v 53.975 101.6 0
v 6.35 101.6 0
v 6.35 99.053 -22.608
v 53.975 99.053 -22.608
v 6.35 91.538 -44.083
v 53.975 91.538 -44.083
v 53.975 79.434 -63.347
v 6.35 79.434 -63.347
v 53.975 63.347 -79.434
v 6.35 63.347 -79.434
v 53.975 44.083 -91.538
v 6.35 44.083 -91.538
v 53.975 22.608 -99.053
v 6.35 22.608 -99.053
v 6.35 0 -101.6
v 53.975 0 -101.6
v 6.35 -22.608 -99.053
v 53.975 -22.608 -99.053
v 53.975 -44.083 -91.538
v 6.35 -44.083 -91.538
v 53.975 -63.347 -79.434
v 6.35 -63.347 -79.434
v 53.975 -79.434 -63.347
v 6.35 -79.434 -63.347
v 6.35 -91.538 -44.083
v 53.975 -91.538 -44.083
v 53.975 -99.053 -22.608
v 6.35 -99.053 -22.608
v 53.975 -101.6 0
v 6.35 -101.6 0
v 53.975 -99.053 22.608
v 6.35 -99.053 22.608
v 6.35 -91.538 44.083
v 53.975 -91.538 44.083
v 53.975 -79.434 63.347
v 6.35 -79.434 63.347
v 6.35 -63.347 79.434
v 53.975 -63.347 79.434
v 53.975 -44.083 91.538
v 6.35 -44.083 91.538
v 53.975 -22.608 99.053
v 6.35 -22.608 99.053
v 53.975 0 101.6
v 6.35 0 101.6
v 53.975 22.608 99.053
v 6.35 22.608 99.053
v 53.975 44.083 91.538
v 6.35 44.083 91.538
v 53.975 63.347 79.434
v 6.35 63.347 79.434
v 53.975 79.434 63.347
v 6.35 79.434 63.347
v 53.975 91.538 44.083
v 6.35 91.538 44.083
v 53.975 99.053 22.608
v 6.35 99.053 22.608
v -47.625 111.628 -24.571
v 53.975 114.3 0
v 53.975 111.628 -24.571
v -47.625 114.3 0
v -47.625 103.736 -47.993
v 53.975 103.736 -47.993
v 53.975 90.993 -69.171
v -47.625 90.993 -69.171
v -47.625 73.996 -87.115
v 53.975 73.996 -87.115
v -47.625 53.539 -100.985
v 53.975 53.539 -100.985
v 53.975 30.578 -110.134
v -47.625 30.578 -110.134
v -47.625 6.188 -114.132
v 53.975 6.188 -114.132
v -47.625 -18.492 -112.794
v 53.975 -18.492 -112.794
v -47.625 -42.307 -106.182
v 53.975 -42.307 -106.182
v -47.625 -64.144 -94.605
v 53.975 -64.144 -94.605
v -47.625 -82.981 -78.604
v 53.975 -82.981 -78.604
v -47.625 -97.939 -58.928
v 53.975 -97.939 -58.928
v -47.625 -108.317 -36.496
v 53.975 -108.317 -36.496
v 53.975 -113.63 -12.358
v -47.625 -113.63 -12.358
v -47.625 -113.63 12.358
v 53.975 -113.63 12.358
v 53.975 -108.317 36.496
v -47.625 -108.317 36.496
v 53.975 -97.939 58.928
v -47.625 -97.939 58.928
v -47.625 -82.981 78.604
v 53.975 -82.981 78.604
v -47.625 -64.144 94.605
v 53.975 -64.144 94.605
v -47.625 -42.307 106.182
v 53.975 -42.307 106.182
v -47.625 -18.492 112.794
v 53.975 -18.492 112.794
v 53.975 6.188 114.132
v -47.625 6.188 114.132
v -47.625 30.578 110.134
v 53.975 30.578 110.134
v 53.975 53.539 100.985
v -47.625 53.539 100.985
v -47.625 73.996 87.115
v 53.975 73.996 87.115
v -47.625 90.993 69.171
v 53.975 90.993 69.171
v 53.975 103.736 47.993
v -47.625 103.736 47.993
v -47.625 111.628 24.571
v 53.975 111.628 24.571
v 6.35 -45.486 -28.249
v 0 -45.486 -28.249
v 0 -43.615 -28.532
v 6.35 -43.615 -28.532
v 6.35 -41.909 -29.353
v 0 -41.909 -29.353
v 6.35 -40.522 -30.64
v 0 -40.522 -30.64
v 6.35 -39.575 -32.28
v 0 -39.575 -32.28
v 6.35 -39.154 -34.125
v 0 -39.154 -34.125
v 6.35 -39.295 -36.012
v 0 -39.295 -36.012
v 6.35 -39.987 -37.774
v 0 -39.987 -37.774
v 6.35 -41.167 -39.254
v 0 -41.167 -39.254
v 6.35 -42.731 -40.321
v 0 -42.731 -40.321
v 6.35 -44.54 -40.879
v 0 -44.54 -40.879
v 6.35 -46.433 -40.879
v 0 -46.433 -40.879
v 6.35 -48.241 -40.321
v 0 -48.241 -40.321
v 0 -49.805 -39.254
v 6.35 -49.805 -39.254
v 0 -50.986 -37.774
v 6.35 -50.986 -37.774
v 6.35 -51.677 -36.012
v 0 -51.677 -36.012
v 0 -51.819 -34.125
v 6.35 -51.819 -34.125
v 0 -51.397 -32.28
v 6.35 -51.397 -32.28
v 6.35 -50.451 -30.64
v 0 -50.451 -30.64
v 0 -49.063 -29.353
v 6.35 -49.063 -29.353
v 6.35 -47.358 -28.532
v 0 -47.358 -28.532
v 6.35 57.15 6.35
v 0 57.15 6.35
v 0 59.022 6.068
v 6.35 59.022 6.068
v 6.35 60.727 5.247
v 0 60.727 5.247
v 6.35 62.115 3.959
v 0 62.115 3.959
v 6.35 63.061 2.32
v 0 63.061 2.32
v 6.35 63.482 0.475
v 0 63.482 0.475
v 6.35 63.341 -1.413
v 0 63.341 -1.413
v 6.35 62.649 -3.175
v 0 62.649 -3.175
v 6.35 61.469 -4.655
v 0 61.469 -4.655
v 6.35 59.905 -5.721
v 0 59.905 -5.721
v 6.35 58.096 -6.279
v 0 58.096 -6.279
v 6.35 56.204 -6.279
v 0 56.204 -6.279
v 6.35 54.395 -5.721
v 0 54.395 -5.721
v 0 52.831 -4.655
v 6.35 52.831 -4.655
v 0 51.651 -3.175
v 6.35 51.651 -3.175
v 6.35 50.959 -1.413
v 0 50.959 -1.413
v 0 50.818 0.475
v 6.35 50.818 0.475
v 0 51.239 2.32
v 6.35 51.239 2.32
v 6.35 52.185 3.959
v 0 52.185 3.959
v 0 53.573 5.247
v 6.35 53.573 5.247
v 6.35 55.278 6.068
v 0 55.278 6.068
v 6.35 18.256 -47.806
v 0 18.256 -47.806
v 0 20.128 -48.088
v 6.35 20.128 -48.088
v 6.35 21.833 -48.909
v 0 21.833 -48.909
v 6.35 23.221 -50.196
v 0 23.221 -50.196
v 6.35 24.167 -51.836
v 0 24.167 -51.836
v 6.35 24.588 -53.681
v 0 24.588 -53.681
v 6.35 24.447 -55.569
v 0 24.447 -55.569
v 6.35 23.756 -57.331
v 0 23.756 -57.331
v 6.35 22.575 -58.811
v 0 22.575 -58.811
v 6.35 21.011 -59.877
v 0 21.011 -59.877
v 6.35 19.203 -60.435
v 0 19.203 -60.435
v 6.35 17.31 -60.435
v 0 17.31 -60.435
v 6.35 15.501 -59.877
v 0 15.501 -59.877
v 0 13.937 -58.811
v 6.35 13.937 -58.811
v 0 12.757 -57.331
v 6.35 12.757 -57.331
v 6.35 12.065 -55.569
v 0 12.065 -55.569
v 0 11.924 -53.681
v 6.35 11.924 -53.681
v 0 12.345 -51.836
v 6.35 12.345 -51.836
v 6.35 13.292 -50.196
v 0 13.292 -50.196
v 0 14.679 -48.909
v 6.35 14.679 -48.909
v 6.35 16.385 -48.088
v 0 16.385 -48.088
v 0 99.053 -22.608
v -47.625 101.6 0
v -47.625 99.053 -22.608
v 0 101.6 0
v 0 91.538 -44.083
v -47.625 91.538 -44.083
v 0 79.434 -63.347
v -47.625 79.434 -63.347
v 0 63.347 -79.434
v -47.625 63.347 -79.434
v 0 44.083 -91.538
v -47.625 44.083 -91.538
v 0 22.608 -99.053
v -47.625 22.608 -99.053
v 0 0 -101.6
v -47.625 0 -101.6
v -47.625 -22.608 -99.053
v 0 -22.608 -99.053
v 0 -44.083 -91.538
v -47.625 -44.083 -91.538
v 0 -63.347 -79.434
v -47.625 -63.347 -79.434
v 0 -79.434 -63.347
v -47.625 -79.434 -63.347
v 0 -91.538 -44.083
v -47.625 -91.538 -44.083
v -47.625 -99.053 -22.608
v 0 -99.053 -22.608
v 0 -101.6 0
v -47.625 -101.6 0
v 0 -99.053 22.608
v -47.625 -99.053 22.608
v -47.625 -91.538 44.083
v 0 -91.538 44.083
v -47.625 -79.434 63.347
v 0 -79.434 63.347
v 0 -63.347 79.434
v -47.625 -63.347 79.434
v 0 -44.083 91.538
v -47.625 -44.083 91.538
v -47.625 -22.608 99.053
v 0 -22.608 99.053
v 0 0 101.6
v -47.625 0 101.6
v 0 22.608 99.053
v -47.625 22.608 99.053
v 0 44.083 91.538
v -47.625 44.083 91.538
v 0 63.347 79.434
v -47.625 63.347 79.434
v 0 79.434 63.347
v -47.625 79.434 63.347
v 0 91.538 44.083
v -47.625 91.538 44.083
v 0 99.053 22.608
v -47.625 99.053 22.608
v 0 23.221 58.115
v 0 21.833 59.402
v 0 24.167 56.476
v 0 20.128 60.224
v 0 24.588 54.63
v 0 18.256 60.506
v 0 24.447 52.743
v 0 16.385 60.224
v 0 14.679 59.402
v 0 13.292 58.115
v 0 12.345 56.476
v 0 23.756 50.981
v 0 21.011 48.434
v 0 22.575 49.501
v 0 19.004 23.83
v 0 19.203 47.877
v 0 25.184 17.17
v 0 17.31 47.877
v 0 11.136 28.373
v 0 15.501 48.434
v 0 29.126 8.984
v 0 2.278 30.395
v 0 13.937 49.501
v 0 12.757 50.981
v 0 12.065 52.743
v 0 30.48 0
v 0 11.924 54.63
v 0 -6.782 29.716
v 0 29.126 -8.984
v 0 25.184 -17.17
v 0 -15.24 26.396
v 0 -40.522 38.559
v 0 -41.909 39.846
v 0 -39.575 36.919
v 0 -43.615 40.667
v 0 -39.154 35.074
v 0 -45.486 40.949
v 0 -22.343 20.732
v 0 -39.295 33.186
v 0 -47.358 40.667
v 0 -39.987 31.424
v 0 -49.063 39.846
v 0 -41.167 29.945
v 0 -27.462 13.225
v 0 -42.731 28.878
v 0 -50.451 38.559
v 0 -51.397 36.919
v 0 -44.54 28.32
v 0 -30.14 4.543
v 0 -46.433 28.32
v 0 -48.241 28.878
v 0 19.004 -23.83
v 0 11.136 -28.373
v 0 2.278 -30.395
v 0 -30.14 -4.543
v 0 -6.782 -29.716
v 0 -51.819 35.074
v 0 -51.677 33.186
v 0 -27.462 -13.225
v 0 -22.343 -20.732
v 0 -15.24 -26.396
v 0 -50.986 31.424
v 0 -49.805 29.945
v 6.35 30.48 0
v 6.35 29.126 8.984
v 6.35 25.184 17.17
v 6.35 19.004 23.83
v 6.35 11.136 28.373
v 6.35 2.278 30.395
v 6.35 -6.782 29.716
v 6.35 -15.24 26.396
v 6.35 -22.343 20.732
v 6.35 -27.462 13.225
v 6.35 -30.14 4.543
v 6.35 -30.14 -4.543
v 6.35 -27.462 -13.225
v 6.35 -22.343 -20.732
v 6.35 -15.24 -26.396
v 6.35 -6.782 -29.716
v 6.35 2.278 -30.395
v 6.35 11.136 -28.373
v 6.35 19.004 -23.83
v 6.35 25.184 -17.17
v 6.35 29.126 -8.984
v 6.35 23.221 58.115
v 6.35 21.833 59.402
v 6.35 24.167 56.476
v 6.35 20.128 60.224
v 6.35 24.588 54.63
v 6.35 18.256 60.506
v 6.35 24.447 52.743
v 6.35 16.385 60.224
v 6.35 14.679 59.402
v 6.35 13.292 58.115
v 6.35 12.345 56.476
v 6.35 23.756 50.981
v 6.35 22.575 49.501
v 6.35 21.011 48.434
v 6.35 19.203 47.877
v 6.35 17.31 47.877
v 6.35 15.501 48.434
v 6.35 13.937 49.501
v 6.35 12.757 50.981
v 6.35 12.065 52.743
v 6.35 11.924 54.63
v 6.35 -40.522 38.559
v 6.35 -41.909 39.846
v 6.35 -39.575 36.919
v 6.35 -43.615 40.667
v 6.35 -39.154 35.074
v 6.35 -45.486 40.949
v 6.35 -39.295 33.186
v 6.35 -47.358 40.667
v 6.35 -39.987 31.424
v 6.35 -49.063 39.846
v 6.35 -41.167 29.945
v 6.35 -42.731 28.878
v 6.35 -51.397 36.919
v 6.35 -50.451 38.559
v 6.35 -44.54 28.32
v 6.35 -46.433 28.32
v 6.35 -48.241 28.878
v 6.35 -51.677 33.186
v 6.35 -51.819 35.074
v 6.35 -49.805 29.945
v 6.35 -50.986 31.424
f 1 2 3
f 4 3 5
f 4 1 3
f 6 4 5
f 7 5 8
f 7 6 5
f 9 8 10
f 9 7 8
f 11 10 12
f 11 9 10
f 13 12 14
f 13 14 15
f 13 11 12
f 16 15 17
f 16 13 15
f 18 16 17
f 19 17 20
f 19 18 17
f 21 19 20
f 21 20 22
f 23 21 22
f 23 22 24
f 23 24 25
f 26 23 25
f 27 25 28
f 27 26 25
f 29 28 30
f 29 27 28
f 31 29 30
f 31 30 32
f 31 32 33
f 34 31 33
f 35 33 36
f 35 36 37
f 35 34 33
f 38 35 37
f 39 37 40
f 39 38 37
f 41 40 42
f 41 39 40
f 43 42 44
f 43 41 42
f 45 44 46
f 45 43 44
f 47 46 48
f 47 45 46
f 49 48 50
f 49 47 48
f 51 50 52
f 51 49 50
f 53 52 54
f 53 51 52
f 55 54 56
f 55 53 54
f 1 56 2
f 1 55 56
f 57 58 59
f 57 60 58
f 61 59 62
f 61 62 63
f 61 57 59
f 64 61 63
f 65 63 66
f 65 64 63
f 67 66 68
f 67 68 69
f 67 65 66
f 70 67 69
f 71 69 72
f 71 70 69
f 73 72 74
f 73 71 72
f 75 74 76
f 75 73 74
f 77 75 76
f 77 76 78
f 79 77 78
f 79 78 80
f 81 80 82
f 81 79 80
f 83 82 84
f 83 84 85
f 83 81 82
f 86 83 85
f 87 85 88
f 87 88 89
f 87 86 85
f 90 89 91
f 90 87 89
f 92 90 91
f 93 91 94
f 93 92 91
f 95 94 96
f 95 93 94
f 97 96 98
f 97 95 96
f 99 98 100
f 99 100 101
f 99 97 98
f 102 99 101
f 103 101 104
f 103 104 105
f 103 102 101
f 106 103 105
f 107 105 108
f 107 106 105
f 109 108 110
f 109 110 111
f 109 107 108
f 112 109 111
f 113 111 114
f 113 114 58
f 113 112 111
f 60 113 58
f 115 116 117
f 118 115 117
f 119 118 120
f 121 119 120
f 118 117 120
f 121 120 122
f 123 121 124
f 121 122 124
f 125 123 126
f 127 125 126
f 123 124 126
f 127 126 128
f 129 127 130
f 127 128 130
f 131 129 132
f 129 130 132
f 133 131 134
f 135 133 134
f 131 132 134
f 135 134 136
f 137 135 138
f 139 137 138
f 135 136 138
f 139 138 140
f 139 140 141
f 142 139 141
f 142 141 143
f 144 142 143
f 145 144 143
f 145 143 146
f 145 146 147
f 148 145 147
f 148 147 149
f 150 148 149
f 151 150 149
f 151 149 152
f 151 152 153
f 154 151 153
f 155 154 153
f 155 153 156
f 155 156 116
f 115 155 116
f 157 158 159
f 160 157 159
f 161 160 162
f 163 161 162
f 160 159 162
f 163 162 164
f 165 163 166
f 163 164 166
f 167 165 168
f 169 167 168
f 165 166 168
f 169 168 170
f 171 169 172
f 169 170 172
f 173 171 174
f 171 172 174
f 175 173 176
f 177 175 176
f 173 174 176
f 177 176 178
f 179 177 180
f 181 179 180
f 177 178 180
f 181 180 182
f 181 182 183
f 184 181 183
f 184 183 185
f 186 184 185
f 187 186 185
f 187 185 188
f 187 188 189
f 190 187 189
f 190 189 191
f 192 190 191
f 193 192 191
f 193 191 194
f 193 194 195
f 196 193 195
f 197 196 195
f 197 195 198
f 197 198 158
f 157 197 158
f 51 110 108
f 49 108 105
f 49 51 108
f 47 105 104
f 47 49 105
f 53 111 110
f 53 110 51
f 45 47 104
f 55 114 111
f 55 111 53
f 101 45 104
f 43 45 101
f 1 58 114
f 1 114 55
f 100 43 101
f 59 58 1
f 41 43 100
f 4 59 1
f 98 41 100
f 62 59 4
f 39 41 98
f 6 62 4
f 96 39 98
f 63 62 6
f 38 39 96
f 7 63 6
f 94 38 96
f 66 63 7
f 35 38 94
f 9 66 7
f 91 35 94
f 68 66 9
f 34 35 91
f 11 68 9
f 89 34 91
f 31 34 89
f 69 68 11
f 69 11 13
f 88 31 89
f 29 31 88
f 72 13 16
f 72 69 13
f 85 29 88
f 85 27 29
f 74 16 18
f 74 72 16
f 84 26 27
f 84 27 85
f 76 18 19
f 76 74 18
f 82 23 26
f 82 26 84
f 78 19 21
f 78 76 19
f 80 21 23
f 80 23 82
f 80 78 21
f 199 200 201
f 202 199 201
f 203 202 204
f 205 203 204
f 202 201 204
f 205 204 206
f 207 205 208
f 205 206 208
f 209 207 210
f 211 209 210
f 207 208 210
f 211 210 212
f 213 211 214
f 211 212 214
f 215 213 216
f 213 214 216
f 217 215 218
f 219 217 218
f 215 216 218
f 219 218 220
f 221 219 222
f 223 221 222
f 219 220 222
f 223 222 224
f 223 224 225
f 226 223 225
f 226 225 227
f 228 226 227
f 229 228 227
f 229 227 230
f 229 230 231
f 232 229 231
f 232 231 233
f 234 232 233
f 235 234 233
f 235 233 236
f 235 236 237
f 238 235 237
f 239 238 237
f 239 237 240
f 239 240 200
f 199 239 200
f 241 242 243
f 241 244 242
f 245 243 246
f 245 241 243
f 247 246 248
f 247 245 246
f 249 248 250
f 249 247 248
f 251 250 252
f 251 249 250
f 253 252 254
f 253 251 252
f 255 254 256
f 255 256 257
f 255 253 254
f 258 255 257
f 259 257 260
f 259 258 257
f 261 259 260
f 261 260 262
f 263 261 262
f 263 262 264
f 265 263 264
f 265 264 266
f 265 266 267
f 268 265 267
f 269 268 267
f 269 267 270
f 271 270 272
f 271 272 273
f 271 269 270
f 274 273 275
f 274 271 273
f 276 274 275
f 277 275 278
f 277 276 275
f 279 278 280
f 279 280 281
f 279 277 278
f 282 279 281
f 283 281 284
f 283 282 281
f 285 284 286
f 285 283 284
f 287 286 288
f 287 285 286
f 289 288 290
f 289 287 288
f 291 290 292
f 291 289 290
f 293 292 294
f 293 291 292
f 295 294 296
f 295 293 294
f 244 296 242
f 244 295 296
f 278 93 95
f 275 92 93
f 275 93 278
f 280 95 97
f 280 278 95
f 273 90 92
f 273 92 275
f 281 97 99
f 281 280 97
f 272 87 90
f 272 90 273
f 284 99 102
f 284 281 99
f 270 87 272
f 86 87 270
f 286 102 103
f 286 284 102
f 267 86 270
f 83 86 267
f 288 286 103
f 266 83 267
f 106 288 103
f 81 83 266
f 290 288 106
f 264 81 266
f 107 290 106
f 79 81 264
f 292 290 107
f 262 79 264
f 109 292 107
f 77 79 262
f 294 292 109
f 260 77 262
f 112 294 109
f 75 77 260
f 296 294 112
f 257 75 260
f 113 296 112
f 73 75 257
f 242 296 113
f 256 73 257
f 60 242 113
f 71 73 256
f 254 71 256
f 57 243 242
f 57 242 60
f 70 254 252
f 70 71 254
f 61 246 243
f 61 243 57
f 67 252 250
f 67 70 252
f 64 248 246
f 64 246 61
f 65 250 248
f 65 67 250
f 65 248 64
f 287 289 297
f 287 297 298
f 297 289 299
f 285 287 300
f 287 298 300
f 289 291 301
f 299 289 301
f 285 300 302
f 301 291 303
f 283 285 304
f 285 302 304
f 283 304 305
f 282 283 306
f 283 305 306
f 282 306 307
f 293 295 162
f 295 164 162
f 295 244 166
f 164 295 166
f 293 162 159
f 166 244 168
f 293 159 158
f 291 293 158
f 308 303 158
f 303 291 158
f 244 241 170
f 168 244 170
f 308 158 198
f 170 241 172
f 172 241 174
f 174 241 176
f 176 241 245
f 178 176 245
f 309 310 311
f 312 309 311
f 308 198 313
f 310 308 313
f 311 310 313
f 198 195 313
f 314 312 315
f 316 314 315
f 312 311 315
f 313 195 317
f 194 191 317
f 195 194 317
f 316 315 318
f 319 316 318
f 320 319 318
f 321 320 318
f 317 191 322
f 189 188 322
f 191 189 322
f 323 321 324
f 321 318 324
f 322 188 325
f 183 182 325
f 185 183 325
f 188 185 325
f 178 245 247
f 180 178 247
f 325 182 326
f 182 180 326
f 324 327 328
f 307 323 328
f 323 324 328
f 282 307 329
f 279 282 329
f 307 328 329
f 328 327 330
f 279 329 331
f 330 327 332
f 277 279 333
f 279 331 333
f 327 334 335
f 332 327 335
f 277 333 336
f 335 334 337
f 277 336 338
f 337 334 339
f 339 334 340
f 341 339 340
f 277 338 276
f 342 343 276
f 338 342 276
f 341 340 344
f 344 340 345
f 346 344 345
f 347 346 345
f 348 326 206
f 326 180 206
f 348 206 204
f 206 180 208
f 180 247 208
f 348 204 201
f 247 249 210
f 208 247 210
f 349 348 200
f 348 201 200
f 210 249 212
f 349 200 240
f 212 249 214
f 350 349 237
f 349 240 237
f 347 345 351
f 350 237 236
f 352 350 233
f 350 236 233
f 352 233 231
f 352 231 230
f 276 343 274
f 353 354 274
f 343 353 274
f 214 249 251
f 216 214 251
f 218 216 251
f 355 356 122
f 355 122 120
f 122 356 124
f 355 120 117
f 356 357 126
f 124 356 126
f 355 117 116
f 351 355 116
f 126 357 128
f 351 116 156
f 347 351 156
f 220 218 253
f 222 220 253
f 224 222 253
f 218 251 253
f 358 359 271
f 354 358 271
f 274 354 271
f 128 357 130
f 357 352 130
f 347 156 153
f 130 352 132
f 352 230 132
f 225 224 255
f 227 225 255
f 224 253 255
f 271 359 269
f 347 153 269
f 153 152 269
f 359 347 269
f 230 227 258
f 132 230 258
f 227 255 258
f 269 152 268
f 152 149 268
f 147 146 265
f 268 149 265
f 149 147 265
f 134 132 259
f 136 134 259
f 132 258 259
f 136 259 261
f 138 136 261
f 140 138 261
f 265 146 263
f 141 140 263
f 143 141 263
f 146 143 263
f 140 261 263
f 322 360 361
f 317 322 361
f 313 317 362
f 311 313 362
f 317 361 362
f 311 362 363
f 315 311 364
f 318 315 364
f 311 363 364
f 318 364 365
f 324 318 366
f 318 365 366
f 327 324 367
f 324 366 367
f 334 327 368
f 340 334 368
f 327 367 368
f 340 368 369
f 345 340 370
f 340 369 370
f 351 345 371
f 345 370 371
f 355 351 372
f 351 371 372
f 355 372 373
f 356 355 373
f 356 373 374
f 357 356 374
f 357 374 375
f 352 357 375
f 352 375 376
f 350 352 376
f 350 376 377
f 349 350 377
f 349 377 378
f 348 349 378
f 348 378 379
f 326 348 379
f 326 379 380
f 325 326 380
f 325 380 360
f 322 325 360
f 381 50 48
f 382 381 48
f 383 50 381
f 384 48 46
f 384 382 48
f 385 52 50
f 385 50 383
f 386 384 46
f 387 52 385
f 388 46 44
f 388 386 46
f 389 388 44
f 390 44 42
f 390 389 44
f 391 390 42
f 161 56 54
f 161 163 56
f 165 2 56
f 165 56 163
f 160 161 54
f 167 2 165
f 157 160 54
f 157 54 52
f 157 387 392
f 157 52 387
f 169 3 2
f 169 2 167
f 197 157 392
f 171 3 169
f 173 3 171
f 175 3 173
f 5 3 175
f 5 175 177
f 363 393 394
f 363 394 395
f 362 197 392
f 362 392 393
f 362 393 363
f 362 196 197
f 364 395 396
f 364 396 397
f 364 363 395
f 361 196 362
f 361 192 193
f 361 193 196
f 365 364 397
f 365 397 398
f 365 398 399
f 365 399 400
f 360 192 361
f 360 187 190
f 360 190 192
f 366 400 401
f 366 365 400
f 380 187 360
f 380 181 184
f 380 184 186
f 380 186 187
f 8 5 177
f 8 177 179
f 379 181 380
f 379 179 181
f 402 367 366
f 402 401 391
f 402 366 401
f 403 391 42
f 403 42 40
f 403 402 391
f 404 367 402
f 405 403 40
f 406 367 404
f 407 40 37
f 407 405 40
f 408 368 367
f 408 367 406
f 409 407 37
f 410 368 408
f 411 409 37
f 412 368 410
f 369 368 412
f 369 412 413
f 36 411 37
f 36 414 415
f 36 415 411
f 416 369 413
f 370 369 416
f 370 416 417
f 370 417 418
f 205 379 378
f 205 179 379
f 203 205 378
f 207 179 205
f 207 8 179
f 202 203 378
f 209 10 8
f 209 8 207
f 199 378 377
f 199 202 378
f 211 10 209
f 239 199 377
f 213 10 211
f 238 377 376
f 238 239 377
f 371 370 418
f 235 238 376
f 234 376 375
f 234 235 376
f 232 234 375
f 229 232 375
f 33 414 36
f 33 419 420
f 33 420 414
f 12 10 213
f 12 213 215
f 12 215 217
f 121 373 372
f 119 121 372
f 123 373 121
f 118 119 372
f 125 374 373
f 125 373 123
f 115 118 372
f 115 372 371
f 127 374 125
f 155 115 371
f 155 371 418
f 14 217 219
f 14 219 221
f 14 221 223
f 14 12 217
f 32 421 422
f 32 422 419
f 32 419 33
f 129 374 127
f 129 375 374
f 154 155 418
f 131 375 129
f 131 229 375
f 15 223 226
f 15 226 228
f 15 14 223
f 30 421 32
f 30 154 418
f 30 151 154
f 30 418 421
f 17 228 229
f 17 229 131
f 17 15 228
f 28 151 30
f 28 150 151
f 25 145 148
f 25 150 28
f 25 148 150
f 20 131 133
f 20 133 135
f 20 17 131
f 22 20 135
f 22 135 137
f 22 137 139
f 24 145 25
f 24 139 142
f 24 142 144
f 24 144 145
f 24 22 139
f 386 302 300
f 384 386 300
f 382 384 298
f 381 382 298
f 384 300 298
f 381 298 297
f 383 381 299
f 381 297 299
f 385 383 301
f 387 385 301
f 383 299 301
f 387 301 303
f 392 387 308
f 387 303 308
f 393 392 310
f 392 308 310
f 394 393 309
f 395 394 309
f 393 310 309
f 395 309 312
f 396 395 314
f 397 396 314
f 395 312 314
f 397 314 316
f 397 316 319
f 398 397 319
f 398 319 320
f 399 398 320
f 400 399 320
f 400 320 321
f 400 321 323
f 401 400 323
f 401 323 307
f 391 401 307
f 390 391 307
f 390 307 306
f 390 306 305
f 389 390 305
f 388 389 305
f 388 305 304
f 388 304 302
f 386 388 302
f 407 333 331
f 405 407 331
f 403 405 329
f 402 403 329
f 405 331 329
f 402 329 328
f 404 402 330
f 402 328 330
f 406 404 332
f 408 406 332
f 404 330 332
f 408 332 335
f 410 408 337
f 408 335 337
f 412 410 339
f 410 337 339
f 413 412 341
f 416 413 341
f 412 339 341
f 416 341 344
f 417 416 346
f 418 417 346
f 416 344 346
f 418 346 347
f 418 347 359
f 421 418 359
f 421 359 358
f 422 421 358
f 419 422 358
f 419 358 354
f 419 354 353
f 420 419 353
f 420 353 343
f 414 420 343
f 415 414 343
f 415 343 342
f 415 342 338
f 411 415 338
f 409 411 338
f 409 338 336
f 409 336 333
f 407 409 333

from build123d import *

# Parameters (mm, degrees)
SKETCH1_W                  = 6.35
SKETCH1_H                  = 101.6
SKETCH2_R                  = 30.48
CUT_EXTRUDE2_DEPTH         = 171.417958634
F_1_2_0_5_DIAMETER_HOLE2_D = 12.7


with BuildPart() as part:
    # Sketch1 → Revolve1 (revolve)
    with BuildSketch(Plane.XY):
        with Locations((3.175, 50.8)):
            Rectangle(SKETCH1_W, SKETCH1_H)
        Polygon((-47.625, 101.6), (0, 101.6), (6.35, 101.6), (53.975, 101.6), (53.975, 114.3), (-47.625, 114.3), align=None)
    revolve(axis=Axis((6.35, 0, 0), (-1, 0, 0)))

    # Sketch2 → Cut-Extrude2 (cut, through all)
    with BuildSketch(Plane(origin=(6.35, 0, 0), x_dir=(0, 0, -1), z_dir=(1, 0, 0))):
        with Locations(Location((0, 0, 0), (0, 0, 90))):
            Circle(SKETCH2_R)
    extrude(amount=-CUT_EXTRUDE2_DEPTH, mode=Mode.SUBTRACT)

    # 1/2 (0.5) Diameter Hole2 (through all)
    with Locations(Plane(origin=(6.35, 0, 0), x_dir=(0, 0, -1), z_dir=(1, 0, 0))):
        with Locations((-54.155626078, 18.25625), (0, 57.15), (54.155626078, 18.25625), (34.599427772, -45.486284722), (-34.599427772, -45.486284722)):
            Hole(F_1_2_0_5_DIAMETER_HOLE2_D / 2)


solid = part.part
